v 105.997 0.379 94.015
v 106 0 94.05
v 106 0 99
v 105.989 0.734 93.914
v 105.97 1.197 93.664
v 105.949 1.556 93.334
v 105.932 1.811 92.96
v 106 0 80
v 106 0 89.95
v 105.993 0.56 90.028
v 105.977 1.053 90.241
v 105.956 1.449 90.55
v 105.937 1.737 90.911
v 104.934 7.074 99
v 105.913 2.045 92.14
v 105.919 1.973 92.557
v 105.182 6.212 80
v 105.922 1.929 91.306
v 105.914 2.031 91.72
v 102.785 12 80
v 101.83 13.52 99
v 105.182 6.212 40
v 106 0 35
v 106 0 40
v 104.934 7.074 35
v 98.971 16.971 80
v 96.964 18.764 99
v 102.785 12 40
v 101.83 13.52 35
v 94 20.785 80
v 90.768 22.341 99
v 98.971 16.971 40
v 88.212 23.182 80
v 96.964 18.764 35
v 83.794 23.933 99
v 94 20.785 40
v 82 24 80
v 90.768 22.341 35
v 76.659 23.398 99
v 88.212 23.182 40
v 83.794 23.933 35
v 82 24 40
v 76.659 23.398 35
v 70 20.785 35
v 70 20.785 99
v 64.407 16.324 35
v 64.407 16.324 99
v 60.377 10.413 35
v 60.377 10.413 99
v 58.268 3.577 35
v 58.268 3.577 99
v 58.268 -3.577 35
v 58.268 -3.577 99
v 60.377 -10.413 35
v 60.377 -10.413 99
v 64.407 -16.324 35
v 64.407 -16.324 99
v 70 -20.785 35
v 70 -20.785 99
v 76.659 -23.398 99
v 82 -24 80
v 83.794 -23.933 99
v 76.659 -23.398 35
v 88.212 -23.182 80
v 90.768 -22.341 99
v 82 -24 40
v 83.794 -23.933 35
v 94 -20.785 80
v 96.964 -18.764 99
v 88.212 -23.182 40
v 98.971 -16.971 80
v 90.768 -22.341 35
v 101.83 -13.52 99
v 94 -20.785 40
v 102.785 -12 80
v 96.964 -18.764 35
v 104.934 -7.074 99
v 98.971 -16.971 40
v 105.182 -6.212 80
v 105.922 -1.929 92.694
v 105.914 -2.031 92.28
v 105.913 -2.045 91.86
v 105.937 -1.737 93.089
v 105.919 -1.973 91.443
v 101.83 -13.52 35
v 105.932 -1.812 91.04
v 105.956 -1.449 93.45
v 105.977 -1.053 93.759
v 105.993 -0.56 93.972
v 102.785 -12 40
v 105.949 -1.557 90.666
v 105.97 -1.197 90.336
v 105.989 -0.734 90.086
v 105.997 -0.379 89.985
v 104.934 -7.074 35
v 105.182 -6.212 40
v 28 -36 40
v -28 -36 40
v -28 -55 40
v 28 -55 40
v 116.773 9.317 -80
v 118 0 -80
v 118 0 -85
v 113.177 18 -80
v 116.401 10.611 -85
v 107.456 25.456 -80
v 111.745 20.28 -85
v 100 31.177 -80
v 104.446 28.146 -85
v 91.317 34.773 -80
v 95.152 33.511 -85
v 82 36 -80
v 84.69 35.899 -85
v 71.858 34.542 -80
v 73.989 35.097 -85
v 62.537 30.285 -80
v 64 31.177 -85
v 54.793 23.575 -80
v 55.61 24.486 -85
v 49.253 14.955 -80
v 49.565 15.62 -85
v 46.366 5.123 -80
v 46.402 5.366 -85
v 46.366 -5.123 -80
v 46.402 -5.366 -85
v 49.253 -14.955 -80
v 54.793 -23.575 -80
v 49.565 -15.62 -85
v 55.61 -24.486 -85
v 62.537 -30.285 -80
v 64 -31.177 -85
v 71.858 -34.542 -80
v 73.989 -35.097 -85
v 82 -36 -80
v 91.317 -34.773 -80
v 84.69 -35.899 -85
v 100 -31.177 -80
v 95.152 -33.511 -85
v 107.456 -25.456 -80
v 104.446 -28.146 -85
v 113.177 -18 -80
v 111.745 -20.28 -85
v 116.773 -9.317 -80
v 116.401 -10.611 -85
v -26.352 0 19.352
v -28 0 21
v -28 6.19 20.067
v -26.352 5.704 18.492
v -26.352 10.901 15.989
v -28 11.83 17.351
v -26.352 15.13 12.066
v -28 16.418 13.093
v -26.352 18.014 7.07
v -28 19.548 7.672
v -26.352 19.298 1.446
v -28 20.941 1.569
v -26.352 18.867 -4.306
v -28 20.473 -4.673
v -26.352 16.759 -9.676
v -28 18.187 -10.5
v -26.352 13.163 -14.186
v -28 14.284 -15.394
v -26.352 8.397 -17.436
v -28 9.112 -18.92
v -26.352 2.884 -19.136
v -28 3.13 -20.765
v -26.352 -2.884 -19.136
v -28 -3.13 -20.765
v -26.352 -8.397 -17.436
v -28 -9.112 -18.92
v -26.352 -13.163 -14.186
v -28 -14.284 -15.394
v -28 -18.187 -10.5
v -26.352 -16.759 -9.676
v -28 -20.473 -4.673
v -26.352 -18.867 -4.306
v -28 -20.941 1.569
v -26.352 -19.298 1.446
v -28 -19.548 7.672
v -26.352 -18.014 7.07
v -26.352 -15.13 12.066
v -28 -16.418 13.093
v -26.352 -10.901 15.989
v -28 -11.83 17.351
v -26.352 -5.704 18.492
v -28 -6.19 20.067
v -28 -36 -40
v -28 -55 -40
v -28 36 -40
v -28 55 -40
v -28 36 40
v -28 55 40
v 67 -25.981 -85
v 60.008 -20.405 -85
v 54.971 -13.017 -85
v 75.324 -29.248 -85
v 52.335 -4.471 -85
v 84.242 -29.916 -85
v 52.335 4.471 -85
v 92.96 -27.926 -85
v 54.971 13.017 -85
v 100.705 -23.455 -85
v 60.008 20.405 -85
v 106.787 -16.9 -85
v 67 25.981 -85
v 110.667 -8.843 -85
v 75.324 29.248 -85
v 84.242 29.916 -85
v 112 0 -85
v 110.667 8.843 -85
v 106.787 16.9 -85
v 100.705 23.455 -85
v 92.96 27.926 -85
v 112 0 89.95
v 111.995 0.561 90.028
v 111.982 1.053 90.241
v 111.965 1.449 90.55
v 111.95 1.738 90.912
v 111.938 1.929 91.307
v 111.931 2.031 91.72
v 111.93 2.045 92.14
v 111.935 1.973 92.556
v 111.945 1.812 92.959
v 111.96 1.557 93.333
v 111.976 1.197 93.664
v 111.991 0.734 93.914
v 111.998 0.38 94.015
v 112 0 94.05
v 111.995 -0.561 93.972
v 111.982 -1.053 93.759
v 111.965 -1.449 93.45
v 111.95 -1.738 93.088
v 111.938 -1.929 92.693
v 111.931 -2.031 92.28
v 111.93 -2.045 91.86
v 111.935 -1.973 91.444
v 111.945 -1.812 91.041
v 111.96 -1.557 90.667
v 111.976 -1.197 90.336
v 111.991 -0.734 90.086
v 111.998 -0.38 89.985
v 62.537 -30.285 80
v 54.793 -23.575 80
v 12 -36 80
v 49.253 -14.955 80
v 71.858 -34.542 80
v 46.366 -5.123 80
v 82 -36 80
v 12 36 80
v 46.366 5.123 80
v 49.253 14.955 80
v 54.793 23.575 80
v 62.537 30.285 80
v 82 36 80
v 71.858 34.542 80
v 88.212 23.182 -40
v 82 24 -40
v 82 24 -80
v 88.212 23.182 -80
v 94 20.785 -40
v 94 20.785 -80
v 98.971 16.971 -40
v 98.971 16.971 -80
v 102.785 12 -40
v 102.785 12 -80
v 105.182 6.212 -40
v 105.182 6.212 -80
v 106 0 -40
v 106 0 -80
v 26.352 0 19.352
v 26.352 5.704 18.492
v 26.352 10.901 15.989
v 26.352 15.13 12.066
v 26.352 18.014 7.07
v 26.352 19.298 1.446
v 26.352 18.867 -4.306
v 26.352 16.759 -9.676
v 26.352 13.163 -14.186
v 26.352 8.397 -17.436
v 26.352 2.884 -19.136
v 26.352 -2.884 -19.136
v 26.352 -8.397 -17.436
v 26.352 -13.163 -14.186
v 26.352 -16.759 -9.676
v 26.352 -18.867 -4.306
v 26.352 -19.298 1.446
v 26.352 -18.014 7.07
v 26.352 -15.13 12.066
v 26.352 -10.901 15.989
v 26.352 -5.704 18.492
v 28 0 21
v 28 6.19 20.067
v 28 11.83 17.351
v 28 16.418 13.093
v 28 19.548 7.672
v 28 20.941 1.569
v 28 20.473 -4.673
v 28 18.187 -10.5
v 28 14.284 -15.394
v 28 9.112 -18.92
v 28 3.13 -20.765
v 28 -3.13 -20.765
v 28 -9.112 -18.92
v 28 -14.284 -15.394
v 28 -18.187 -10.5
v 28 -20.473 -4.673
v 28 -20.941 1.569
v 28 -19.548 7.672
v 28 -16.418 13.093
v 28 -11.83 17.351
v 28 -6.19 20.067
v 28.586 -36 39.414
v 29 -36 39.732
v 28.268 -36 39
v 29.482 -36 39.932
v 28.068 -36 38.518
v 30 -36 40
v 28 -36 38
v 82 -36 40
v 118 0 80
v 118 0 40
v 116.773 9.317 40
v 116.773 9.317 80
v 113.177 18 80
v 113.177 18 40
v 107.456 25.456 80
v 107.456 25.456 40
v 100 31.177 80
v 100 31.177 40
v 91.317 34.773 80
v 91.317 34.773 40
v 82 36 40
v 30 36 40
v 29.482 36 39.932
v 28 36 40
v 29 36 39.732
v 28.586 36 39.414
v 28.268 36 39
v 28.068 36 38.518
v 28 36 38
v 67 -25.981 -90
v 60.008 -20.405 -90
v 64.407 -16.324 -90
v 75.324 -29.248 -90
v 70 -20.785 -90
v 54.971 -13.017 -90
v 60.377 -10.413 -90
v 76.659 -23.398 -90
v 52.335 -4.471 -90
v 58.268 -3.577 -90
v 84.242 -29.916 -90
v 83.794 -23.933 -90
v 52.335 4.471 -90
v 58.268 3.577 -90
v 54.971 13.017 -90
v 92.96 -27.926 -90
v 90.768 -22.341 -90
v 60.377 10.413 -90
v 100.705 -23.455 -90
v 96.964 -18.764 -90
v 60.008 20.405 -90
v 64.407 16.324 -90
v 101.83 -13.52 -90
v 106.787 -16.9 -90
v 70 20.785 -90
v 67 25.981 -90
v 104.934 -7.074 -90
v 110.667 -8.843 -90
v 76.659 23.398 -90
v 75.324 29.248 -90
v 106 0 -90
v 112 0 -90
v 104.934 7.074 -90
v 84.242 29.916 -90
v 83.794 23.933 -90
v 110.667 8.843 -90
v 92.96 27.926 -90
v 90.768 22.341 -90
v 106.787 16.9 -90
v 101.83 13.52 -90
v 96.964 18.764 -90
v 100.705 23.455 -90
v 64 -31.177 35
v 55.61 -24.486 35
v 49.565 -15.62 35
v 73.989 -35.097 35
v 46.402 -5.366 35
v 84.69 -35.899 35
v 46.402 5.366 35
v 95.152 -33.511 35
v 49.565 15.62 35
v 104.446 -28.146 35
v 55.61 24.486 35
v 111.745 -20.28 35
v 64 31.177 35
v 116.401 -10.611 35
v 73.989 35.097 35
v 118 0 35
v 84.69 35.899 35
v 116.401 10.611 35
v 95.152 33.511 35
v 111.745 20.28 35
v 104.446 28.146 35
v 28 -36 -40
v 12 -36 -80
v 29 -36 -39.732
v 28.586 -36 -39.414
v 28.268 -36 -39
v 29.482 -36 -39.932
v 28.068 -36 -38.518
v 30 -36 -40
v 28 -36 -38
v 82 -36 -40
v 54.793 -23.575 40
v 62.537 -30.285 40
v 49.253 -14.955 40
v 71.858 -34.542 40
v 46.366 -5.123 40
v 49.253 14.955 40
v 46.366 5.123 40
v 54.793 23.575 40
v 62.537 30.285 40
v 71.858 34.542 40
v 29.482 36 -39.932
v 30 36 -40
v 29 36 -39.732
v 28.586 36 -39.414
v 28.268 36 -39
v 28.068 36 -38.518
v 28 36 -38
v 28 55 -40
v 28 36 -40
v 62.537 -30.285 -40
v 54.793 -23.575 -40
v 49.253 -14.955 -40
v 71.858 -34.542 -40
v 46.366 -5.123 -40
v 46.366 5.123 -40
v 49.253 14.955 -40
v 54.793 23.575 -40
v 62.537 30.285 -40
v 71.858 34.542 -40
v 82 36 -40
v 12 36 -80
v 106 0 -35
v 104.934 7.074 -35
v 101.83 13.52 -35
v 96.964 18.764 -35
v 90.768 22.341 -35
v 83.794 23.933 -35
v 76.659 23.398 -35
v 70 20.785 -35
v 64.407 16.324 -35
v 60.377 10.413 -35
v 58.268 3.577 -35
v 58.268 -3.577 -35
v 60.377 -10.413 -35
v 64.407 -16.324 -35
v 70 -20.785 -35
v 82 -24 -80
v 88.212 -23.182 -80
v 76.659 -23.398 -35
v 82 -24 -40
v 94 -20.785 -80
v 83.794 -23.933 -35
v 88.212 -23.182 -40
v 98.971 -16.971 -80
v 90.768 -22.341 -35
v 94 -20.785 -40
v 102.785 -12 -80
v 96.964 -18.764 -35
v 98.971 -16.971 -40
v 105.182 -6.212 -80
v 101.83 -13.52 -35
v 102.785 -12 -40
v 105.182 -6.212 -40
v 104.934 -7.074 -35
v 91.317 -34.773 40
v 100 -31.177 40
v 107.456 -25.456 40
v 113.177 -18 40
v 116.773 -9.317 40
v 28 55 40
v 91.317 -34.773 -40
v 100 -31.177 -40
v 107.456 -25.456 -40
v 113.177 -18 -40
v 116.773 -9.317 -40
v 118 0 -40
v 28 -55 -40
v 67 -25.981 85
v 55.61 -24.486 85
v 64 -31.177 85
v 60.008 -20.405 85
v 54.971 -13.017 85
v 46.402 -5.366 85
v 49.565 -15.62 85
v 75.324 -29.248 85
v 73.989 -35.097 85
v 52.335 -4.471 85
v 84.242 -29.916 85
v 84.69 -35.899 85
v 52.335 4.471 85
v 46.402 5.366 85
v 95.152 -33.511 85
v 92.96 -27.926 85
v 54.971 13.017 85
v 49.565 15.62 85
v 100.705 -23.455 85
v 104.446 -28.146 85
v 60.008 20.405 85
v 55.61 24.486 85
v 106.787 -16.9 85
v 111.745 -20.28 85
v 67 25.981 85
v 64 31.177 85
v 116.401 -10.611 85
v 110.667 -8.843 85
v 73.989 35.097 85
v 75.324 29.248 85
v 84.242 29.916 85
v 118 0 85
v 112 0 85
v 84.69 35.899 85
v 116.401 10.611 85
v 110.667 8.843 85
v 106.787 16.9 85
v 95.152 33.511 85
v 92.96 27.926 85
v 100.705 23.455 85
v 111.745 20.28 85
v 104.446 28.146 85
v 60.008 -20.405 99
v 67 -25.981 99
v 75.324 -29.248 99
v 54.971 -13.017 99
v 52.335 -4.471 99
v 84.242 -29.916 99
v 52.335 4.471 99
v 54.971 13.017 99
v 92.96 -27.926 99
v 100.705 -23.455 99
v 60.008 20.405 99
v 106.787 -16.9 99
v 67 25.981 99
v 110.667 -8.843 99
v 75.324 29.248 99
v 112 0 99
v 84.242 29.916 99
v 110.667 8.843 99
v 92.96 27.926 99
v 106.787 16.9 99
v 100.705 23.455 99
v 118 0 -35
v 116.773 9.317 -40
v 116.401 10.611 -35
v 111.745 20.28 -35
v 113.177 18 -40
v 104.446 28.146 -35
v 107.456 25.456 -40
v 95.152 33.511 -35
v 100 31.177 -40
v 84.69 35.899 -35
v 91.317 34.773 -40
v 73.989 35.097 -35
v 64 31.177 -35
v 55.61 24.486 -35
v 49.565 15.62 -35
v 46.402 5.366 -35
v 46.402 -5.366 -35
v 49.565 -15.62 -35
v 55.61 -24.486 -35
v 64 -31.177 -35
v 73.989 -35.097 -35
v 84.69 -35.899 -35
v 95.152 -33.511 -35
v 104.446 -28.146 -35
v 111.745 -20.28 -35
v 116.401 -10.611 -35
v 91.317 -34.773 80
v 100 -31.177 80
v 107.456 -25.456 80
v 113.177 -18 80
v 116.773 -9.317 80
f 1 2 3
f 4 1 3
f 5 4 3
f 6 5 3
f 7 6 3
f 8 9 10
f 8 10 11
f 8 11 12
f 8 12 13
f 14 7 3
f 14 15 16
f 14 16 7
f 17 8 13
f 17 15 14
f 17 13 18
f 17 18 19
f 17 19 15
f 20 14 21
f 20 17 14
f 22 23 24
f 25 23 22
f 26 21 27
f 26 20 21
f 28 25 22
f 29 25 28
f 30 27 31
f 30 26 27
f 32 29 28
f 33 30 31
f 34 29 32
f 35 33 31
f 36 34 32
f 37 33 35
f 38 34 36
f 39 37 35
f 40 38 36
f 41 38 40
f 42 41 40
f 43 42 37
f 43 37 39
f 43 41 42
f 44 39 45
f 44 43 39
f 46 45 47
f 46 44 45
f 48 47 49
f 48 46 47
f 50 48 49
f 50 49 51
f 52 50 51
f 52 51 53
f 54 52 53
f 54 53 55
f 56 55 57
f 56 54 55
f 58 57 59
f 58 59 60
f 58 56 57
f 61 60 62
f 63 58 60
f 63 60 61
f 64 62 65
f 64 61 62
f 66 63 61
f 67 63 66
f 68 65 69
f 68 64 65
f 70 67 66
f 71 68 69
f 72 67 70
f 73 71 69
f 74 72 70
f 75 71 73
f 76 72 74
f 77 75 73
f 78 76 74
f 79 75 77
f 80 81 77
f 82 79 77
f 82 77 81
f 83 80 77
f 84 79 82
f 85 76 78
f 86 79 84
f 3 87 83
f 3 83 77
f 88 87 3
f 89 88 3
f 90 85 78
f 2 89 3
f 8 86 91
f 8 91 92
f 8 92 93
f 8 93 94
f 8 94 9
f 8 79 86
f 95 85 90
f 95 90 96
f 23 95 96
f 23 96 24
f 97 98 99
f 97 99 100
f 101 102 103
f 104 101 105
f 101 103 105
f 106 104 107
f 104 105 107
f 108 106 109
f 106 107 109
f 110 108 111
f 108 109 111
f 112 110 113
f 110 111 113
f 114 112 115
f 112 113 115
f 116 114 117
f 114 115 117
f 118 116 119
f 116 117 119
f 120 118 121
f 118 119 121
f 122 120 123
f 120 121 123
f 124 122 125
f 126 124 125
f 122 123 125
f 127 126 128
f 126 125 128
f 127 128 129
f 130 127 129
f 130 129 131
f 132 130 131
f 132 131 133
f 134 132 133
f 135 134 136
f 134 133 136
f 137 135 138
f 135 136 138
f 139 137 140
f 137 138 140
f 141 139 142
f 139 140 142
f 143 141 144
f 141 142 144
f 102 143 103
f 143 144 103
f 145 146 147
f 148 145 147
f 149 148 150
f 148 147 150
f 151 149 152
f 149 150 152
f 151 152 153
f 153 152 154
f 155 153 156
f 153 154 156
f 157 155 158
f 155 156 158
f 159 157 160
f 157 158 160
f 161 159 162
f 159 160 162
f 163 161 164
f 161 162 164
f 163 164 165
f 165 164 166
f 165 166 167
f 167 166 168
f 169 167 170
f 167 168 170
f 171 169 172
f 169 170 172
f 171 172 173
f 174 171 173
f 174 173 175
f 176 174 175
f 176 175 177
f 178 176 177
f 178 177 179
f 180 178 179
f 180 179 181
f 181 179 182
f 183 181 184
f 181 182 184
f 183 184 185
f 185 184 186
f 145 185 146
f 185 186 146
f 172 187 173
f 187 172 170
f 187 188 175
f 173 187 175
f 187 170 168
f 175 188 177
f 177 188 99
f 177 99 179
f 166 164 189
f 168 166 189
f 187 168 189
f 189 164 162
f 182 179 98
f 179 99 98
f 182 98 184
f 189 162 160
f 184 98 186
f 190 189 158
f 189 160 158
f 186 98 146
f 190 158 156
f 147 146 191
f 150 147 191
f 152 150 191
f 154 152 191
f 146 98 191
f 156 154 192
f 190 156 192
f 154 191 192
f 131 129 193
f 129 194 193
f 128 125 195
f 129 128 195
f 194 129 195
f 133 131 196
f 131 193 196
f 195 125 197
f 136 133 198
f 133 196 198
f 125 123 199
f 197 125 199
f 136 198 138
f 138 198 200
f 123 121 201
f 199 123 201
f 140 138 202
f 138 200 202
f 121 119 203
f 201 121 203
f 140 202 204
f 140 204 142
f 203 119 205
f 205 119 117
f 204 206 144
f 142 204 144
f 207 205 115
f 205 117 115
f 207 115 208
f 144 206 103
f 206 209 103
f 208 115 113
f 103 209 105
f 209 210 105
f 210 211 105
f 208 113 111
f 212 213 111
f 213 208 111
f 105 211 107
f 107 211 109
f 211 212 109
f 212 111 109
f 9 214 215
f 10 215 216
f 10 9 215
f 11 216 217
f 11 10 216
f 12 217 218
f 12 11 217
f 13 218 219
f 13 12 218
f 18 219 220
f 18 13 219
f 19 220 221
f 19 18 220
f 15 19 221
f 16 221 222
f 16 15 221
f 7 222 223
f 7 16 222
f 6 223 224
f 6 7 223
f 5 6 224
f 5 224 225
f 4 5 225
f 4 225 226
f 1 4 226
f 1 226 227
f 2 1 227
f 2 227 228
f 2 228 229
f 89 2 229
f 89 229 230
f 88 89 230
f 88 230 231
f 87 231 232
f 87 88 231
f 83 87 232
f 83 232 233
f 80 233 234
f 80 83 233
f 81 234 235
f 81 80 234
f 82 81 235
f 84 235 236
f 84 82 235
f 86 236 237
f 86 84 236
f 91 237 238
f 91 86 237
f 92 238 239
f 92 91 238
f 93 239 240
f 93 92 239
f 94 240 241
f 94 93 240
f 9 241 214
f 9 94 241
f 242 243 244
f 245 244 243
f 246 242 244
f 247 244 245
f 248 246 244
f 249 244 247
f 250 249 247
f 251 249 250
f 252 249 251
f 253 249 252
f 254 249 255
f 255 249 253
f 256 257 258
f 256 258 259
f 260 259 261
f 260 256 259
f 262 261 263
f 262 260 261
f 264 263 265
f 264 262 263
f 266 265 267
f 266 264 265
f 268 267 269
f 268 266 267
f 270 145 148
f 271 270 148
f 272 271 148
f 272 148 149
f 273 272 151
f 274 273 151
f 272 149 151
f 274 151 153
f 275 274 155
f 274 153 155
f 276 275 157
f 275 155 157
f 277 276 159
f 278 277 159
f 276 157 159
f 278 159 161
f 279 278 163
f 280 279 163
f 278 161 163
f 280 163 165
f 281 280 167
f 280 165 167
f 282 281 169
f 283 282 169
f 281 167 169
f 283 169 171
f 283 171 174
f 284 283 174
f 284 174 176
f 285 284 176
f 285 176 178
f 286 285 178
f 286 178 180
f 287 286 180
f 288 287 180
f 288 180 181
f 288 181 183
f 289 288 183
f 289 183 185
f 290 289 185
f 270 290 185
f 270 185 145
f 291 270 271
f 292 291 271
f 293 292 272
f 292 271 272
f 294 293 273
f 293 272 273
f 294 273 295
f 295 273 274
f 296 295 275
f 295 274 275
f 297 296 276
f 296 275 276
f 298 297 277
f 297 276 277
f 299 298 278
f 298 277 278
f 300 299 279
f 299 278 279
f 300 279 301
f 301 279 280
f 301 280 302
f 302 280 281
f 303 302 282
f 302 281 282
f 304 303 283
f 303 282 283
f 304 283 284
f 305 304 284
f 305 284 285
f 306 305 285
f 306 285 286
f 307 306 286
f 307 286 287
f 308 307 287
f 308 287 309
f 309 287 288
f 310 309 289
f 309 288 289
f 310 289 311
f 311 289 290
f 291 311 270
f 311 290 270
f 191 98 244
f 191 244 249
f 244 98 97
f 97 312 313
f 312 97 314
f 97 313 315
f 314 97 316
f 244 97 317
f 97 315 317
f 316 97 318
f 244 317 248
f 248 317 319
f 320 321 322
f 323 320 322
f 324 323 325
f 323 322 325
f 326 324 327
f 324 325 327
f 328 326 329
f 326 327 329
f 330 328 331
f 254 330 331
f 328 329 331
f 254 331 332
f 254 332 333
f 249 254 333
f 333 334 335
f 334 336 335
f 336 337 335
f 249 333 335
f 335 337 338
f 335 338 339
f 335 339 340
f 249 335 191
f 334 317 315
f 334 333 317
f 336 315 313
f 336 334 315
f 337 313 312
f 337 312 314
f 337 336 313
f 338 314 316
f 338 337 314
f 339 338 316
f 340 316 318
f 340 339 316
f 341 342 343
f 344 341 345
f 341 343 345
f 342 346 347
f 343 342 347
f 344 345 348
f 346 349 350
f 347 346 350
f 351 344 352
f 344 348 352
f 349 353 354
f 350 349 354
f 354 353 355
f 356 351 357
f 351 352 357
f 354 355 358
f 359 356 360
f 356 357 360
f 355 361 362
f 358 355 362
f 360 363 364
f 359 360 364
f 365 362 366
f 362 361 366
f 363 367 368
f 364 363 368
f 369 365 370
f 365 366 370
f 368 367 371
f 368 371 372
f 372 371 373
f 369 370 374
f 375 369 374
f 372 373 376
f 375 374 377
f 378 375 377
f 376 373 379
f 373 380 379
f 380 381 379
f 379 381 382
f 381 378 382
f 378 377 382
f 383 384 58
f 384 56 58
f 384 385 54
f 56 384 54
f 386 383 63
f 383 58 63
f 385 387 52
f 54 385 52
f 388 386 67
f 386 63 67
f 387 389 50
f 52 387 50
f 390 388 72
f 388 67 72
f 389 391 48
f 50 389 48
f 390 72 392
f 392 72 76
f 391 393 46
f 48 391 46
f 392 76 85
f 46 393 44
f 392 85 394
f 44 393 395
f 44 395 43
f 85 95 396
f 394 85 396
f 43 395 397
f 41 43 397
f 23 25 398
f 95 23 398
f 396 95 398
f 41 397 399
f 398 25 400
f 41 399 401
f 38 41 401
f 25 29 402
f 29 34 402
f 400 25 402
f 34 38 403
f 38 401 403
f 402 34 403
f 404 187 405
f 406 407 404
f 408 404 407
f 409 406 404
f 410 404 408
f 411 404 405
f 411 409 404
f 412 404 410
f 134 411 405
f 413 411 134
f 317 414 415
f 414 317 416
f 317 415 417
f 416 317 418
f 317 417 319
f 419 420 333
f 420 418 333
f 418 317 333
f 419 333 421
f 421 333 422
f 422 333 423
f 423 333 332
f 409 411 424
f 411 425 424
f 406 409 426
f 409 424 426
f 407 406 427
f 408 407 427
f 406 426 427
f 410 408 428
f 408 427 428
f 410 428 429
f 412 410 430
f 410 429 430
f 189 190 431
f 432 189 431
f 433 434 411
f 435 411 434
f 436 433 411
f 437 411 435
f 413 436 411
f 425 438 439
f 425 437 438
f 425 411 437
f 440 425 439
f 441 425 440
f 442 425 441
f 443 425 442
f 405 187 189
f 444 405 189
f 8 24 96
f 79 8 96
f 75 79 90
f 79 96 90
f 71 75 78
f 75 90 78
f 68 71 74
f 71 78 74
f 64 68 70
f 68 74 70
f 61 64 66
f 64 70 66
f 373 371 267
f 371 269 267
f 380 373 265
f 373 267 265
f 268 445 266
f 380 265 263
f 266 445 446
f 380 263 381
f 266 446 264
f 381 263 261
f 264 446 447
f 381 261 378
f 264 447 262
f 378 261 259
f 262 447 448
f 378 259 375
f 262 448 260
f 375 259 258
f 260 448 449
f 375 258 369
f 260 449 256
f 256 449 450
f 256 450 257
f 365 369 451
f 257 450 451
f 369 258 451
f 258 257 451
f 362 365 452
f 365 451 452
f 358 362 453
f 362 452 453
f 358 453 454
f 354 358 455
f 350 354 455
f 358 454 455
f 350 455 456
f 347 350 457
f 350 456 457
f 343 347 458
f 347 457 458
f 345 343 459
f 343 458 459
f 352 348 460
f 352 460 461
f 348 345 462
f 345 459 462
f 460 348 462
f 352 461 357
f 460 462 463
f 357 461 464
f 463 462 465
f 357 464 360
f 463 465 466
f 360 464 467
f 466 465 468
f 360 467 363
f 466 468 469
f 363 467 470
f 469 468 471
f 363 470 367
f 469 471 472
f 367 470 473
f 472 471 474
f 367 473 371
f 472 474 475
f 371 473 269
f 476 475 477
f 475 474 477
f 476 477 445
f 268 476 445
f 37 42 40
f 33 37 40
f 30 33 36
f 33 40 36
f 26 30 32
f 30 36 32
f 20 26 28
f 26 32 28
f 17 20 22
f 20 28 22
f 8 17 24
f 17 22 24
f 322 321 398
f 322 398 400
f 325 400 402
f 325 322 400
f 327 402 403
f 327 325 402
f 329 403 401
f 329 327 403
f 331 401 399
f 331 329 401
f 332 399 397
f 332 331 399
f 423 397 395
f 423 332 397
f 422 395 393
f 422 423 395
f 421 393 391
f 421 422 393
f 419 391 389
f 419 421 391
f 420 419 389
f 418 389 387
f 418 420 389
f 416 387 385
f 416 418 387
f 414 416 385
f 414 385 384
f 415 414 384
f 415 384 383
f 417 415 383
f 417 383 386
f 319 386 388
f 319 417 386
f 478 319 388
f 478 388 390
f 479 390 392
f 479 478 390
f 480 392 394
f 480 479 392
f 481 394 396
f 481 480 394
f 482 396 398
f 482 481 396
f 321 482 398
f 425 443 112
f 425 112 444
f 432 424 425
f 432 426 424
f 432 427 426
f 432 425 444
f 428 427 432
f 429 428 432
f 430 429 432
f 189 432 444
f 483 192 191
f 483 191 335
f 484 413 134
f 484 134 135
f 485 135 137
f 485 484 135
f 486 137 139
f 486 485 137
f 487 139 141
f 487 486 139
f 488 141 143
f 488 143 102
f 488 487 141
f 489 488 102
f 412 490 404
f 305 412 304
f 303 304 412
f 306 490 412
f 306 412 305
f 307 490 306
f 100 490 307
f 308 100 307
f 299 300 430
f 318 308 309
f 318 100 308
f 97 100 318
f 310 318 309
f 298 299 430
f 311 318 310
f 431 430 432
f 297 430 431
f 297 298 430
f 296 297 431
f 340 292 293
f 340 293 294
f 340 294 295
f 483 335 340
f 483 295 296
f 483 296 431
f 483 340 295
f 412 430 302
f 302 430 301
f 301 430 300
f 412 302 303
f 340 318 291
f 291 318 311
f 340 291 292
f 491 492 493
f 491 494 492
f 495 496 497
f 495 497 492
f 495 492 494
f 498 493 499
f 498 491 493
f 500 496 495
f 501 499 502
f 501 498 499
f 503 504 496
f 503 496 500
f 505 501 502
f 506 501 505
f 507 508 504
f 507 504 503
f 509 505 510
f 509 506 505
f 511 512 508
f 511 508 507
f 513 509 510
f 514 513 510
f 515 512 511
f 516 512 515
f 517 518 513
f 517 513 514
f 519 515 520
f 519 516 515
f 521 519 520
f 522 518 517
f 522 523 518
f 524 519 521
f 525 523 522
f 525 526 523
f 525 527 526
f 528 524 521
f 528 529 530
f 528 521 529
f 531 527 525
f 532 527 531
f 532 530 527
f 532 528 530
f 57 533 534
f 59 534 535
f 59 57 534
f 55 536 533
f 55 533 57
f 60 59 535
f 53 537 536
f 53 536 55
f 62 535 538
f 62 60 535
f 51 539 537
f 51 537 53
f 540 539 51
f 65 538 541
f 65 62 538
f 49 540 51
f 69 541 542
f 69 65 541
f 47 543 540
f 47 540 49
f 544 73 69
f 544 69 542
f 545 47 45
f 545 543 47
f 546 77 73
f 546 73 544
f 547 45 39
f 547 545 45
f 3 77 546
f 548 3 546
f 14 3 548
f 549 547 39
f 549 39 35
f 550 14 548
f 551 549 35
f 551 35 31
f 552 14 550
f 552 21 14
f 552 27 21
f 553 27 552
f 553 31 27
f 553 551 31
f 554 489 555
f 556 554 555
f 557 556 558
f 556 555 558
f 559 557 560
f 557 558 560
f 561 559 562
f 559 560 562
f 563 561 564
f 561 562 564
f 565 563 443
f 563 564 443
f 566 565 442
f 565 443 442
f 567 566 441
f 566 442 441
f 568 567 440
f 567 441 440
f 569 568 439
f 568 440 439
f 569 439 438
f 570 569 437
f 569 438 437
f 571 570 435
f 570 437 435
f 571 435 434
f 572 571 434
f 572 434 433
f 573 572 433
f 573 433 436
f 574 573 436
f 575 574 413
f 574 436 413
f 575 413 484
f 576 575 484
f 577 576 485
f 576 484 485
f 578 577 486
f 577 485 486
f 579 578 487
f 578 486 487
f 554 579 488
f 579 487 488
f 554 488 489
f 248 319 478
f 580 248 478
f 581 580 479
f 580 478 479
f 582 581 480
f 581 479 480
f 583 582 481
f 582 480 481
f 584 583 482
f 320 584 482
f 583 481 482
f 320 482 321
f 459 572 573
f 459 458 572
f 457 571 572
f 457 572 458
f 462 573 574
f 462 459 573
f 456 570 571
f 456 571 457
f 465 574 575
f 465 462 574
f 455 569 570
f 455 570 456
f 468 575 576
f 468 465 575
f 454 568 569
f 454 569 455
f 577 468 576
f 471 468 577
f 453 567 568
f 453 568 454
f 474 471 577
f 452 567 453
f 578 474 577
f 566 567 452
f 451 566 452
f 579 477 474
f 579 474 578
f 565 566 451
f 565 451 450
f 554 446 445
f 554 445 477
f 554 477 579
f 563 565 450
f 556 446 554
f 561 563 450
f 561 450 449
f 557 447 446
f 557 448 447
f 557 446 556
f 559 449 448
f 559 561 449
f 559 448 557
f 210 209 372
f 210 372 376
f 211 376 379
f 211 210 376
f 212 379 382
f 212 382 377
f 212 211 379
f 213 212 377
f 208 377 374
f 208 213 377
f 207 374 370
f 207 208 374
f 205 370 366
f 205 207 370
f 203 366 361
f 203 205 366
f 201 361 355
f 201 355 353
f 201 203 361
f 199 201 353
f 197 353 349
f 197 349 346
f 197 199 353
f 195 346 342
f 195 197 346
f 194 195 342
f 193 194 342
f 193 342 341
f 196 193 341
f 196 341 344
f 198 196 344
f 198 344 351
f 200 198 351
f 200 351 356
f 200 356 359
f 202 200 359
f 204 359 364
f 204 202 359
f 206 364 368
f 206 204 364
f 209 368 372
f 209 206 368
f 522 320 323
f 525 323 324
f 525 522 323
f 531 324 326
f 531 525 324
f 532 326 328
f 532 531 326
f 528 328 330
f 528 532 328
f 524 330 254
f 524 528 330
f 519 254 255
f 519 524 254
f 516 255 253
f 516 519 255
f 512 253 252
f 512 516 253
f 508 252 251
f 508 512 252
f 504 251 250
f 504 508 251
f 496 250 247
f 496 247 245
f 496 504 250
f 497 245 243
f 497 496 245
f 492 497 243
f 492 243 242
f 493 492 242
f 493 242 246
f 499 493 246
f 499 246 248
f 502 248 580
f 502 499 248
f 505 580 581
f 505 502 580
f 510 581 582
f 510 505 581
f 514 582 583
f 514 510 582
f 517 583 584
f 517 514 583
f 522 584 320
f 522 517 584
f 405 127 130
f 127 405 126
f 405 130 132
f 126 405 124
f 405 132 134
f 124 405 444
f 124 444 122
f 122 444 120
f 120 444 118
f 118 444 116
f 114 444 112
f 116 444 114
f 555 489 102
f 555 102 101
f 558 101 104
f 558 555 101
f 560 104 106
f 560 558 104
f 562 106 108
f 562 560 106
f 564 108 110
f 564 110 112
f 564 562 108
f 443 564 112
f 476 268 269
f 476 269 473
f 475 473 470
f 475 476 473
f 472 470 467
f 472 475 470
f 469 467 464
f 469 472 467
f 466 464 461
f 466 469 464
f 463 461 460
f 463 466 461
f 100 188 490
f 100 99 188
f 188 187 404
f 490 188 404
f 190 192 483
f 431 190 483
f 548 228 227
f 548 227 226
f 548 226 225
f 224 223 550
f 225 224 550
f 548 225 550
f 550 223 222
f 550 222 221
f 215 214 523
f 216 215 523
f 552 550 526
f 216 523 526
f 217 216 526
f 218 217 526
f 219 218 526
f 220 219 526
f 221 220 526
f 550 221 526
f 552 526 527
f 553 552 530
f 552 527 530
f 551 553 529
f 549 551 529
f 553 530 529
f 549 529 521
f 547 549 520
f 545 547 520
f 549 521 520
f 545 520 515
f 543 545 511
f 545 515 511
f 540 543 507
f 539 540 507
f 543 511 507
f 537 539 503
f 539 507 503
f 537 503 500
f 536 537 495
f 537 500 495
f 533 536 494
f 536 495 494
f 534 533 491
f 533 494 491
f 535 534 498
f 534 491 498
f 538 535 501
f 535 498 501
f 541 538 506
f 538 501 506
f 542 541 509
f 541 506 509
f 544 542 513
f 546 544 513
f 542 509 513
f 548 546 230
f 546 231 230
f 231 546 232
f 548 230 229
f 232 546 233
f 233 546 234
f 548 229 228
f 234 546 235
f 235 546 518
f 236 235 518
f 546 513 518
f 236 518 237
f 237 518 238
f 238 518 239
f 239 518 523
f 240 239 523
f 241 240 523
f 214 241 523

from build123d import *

# Parameters (mm, degrees)
SKETCH_1_W          = 56
SKETCH_1_H          = 110
EXTRUDE_1_DEPTH     = 40
SKETCH_3_W          = 56
SKETCH_3_H          = 72
EXTRUDE_2_DEPTH     = 40
SKETCH_4_R          = 36
SKETCH_4_R_2        = 24
EXTRUDE_3_DEPTH     = 25
SKETCH_5_R          = 30
SKETCH_5_R_2        = 24
EXTRUDE_4_DEPTH     = 5
CHAMFER_1_SIZE      = 40
FILLET_1_R          = 2
SKETCH_6_R          = 19.352
CUT_EXTRUDE_1_DEPTH = 147
CHAMFER_2_SIZE      = 1.648
SKETCH_7_R          = 30
SKETCH_7_R_2        = 24
EXTRUDE_5_DEPTH     = 9
SKETCH_8_R          = 2.05
CUT_EXTRUDE_2_DEPTH = 37


with BuildPart() as part:
    # Эскиз1 → Бобышка-Вытянуть1 (new body)
    with BuildSketch(Plane.XY):
        Rectangle(SKETCH_1_W, SKETCH_1_H)
    extrude(amount=EXTRUDE_1_DEPTH)

    # Эскиз3 → Бобышка-Вытянуть2 (add)
    with BuildSketch(Plane.XY.offset(40)):
        Rectangle(SKETCH_3_W, SKETCH_3_H)
        with BuildLine():
            Line((28, 36), (28, -36))
            Line((28, -36), (82, -36))
            ThreePointArc((82, -36), (46, 0), (82, 36))
            Line((82, 36), (28, 36))
        make_face()
        with BuildLine():
            ThreePointArc((82, 36), (46, 0), (82, -36))
            Line((82, -36), (82, -24))
            ThreePointArc((82, -24), (58, 0), (82, 24))
            Line((82, 24), (82, 36))
        make_face()
        with BuildLine():
            Line((82, -24), (82, -36))
            ThreePointArc((82, -36), (107.455844, -25.455844), (118, 0))
            ThreePointArc((118, 0), (107.455844, 25.455844), (82, 36))
            Line((82, 36), (82, 24))
            ThreePointArc((82, 24), (98.970563, 16.970563), (106, 0))
            ThreePointArc((106, 0), (98.970563, -16.970563), (82, -24))
        make_face()
    extrude(amount=EXTRUDE_2_DEPTH)

    # Эскиз4 → Бобышка-Вытянуть3 (add, symmetric)
    with BuildSketch(Plane.XY.offset(60)):
        with Locations((82, 0)):
            Circle(SKETCH_4_R)
        with Locations((82, 0)):
            Circle(SKETCH_4_R_2, mode=Mode.SUBTRACT)
    extrude(amount=EXTRUDE_3_DEPTH, both=True)

    # Эскиз5 → Бобышка-Вытянуть4 (add)
    with BuildSketch(Plane.XY.offset(85)):
        with Locations((82, 0)):
            Circle(SKETCH_5_R)
        with Locations((82, 0)):
            Circle(SKETCH_5_R_2, mode=Mode.SUBTRACT)
    extrude(amount=EXTRUDE_4_DEPTH)

    # Фаска1
    chamfer_1_edges = [part.edges().sort_by_distance(p)[0] for p in [
        (-28, 0, 80),
    ]]
    chamfer(chamfer_1_edges, length=CHAMFER_1_SIZE)

    # Скругление1
    fillet_1_edges = [part.edges().sort_by_distance(p)[0] for p in [
        (28, 0, 40),
    ]]
    fillet(fillet_1_edges, radius=FILLET_1_R)

    # Зеркальное отражение1: part across plane


with BuildPart() as part_1:
    add(part.part)
    add(part.part.mirror(Plane(origin=(0, 0, 0), x_dir=(1, 0, 0), z_dir=(0, 0, -1))))

    # Эскиз6 → Вырез-Вытянуть1 (cut, through all)
    with BuildSketch(Plane.ZY.offset(28)):
        Circle(SKETCH_6_R)
    extrude(amount=-CUT_EXTRUDE_1_DEPTH, mode=Mode.SUBTRACT)

    # Фаска2
    chamfer_2_edges = [part_1.edges().sort_by_distance(p)[0] for p in [
        (28, -13.68393, 13.68393),
        (-28, 13.68393, 13.68393),
    ]]
    chamfer(chamfer_2_edges, length=CHAMFER_2_SIZE)

    # Эскиз7 → Бобышка-Вытянуть5 (add)
    with BuildSketch(Plane.XY.offset(90)):
        with Locations((82, 0)):
            Circle(SKETCH_7_R)
        with Locations((82, 0)):
            Circle(SKETCH_7_R_2, mode=Mode.SUBTRACT)
    extrude(amount=EXTRUDE_5_DEPTH)

    # Эскиз8 → Вырез-Вытянуть2 (cut, through all)
    with BuildSketch(Plane(origin=(82, 0, 0), x_dir=(0, 0, -1), z_dir=(1, 0, 0))):
        with Locations((-92, 0)):
            Circle(SKETCH_8_R)
    extrude(amount=CUT_EXTRUDE_2_DEPTH, mode=Mode.SUBTRACT)


solid = part_1.part
